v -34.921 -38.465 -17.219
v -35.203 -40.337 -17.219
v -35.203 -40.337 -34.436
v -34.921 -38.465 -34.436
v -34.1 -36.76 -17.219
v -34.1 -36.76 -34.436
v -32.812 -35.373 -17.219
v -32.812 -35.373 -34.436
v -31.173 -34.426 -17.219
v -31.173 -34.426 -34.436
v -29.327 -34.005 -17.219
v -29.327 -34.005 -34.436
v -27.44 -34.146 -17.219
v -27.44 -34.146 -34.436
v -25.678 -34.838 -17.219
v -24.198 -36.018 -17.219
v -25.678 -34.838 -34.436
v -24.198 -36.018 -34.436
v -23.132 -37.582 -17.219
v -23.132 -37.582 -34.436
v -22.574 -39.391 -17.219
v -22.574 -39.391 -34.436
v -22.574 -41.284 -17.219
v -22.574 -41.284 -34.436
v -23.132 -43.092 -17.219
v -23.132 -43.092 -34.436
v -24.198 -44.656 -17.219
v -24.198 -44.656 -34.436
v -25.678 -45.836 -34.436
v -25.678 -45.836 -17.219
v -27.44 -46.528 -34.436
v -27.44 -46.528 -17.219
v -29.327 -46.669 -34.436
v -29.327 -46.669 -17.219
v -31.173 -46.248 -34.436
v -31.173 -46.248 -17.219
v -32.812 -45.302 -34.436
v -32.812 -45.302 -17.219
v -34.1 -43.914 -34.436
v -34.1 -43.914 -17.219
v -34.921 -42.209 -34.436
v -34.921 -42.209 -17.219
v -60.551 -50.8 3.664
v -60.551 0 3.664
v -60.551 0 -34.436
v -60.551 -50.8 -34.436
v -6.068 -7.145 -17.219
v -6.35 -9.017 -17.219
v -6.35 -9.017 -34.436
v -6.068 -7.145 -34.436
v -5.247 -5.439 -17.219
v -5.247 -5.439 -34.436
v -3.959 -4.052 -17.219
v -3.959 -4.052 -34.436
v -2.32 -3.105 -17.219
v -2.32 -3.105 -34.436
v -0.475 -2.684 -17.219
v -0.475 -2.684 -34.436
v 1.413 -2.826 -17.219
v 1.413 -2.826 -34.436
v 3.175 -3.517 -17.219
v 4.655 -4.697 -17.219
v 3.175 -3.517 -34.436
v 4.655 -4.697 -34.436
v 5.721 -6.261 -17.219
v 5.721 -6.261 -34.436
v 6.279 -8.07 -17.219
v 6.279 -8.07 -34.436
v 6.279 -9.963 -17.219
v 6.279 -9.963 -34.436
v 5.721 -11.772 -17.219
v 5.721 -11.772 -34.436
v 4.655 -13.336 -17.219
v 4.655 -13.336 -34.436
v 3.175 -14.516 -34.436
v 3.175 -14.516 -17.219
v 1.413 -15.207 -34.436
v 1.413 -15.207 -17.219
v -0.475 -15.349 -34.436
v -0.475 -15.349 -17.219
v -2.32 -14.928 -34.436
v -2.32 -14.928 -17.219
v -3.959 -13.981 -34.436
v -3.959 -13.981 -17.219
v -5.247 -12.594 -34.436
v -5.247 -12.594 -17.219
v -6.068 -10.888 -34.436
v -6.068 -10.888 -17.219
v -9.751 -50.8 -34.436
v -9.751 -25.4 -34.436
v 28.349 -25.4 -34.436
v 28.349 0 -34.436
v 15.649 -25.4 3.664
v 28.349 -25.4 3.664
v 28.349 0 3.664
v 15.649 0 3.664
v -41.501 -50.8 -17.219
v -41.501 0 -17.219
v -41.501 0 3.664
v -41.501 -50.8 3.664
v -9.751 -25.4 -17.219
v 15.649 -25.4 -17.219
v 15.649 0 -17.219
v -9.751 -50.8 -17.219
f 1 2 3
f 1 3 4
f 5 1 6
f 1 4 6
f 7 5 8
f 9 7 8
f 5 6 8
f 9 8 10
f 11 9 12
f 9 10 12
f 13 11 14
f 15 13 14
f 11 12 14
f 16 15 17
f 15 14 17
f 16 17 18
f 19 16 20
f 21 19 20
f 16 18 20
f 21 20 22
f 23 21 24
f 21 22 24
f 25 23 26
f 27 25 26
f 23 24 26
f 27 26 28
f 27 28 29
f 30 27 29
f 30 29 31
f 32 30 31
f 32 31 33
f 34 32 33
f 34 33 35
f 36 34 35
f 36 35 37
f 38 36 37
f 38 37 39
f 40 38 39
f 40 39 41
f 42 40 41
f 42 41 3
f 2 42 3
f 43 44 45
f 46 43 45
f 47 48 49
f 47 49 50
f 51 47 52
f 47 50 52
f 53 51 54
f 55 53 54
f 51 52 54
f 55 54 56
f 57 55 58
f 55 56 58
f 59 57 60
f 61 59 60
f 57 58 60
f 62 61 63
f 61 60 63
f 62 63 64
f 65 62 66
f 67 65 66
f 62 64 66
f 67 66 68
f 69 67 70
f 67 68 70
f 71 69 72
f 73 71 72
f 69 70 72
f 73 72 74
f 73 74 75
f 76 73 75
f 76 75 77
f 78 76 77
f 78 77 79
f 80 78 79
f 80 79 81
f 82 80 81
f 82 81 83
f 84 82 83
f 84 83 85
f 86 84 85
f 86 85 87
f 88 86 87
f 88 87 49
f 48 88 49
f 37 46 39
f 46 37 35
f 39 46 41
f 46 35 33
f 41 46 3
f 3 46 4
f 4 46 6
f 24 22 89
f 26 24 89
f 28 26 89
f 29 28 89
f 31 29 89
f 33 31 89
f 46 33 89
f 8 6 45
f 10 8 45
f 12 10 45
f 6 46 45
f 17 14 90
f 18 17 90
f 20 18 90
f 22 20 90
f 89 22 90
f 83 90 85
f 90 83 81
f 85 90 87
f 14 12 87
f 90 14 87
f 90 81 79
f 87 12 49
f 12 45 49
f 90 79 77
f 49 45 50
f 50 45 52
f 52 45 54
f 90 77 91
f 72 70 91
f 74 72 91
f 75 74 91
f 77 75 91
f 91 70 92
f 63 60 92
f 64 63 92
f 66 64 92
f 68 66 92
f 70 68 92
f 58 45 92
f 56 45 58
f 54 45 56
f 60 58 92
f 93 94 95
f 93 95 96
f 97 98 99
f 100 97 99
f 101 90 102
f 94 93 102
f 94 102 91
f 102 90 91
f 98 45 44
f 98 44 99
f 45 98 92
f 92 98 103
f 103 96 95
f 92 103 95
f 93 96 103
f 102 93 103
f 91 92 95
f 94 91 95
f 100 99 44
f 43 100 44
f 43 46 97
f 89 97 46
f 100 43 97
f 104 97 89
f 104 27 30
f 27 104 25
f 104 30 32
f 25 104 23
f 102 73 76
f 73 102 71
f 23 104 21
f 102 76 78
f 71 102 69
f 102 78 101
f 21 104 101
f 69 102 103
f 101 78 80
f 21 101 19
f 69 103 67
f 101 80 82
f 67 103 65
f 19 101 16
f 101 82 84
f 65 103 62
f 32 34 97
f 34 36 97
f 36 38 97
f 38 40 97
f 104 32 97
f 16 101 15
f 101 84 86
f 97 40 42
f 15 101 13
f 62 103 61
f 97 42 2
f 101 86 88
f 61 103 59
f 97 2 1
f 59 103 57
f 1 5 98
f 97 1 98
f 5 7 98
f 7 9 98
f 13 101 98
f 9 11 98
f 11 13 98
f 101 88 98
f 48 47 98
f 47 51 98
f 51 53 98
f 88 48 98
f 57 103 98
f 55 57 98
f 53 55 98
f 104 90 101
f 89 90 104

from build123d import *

# Parameters (mm, degrees)
F1_DEPTH = 50.8
F2_W     = 38.1
F2_H     = 25.4
F3_DEPTH = 38.101
F5_D     = 12.7


with BuildPart() as f1:
    # F0 (on Front) → F1 (new body)
    with BuildSketch(Plane.XZ):
        Polygon((-41.500658, 3.663934), (-60.550658, 3.663934), (-60.550658, -34.436066), (28.349342, -34.436066), (28.349342, 3.663934), (15.649342, 3.663934), (15.649342, -17.219239), (-41.500658, -17.219239), align=None)
    extrude(amount=F1_DEPTH)

    # F2 (on face) → F3 (cut, through all)
    with BuildSketch(Plane(origin=(0, 0, -34.436066), x_dir=(1, 0, 0), z_dir=(0, 0, -1))):
        with Locations((9.299342, 38.1)):
            Rectangle(F2_W, F2_H)
    extrude(amount=-F3_DEPTH, mode=Mode.SUBTRACT)

    # F5 (through all)
    with Locations(Plane.XY.offset(-17.219239)):
        with Locations((-28.852955, -40.337186), (0, -9.016548)):
            Hole(F5_D / 2)


solid = f1.part
